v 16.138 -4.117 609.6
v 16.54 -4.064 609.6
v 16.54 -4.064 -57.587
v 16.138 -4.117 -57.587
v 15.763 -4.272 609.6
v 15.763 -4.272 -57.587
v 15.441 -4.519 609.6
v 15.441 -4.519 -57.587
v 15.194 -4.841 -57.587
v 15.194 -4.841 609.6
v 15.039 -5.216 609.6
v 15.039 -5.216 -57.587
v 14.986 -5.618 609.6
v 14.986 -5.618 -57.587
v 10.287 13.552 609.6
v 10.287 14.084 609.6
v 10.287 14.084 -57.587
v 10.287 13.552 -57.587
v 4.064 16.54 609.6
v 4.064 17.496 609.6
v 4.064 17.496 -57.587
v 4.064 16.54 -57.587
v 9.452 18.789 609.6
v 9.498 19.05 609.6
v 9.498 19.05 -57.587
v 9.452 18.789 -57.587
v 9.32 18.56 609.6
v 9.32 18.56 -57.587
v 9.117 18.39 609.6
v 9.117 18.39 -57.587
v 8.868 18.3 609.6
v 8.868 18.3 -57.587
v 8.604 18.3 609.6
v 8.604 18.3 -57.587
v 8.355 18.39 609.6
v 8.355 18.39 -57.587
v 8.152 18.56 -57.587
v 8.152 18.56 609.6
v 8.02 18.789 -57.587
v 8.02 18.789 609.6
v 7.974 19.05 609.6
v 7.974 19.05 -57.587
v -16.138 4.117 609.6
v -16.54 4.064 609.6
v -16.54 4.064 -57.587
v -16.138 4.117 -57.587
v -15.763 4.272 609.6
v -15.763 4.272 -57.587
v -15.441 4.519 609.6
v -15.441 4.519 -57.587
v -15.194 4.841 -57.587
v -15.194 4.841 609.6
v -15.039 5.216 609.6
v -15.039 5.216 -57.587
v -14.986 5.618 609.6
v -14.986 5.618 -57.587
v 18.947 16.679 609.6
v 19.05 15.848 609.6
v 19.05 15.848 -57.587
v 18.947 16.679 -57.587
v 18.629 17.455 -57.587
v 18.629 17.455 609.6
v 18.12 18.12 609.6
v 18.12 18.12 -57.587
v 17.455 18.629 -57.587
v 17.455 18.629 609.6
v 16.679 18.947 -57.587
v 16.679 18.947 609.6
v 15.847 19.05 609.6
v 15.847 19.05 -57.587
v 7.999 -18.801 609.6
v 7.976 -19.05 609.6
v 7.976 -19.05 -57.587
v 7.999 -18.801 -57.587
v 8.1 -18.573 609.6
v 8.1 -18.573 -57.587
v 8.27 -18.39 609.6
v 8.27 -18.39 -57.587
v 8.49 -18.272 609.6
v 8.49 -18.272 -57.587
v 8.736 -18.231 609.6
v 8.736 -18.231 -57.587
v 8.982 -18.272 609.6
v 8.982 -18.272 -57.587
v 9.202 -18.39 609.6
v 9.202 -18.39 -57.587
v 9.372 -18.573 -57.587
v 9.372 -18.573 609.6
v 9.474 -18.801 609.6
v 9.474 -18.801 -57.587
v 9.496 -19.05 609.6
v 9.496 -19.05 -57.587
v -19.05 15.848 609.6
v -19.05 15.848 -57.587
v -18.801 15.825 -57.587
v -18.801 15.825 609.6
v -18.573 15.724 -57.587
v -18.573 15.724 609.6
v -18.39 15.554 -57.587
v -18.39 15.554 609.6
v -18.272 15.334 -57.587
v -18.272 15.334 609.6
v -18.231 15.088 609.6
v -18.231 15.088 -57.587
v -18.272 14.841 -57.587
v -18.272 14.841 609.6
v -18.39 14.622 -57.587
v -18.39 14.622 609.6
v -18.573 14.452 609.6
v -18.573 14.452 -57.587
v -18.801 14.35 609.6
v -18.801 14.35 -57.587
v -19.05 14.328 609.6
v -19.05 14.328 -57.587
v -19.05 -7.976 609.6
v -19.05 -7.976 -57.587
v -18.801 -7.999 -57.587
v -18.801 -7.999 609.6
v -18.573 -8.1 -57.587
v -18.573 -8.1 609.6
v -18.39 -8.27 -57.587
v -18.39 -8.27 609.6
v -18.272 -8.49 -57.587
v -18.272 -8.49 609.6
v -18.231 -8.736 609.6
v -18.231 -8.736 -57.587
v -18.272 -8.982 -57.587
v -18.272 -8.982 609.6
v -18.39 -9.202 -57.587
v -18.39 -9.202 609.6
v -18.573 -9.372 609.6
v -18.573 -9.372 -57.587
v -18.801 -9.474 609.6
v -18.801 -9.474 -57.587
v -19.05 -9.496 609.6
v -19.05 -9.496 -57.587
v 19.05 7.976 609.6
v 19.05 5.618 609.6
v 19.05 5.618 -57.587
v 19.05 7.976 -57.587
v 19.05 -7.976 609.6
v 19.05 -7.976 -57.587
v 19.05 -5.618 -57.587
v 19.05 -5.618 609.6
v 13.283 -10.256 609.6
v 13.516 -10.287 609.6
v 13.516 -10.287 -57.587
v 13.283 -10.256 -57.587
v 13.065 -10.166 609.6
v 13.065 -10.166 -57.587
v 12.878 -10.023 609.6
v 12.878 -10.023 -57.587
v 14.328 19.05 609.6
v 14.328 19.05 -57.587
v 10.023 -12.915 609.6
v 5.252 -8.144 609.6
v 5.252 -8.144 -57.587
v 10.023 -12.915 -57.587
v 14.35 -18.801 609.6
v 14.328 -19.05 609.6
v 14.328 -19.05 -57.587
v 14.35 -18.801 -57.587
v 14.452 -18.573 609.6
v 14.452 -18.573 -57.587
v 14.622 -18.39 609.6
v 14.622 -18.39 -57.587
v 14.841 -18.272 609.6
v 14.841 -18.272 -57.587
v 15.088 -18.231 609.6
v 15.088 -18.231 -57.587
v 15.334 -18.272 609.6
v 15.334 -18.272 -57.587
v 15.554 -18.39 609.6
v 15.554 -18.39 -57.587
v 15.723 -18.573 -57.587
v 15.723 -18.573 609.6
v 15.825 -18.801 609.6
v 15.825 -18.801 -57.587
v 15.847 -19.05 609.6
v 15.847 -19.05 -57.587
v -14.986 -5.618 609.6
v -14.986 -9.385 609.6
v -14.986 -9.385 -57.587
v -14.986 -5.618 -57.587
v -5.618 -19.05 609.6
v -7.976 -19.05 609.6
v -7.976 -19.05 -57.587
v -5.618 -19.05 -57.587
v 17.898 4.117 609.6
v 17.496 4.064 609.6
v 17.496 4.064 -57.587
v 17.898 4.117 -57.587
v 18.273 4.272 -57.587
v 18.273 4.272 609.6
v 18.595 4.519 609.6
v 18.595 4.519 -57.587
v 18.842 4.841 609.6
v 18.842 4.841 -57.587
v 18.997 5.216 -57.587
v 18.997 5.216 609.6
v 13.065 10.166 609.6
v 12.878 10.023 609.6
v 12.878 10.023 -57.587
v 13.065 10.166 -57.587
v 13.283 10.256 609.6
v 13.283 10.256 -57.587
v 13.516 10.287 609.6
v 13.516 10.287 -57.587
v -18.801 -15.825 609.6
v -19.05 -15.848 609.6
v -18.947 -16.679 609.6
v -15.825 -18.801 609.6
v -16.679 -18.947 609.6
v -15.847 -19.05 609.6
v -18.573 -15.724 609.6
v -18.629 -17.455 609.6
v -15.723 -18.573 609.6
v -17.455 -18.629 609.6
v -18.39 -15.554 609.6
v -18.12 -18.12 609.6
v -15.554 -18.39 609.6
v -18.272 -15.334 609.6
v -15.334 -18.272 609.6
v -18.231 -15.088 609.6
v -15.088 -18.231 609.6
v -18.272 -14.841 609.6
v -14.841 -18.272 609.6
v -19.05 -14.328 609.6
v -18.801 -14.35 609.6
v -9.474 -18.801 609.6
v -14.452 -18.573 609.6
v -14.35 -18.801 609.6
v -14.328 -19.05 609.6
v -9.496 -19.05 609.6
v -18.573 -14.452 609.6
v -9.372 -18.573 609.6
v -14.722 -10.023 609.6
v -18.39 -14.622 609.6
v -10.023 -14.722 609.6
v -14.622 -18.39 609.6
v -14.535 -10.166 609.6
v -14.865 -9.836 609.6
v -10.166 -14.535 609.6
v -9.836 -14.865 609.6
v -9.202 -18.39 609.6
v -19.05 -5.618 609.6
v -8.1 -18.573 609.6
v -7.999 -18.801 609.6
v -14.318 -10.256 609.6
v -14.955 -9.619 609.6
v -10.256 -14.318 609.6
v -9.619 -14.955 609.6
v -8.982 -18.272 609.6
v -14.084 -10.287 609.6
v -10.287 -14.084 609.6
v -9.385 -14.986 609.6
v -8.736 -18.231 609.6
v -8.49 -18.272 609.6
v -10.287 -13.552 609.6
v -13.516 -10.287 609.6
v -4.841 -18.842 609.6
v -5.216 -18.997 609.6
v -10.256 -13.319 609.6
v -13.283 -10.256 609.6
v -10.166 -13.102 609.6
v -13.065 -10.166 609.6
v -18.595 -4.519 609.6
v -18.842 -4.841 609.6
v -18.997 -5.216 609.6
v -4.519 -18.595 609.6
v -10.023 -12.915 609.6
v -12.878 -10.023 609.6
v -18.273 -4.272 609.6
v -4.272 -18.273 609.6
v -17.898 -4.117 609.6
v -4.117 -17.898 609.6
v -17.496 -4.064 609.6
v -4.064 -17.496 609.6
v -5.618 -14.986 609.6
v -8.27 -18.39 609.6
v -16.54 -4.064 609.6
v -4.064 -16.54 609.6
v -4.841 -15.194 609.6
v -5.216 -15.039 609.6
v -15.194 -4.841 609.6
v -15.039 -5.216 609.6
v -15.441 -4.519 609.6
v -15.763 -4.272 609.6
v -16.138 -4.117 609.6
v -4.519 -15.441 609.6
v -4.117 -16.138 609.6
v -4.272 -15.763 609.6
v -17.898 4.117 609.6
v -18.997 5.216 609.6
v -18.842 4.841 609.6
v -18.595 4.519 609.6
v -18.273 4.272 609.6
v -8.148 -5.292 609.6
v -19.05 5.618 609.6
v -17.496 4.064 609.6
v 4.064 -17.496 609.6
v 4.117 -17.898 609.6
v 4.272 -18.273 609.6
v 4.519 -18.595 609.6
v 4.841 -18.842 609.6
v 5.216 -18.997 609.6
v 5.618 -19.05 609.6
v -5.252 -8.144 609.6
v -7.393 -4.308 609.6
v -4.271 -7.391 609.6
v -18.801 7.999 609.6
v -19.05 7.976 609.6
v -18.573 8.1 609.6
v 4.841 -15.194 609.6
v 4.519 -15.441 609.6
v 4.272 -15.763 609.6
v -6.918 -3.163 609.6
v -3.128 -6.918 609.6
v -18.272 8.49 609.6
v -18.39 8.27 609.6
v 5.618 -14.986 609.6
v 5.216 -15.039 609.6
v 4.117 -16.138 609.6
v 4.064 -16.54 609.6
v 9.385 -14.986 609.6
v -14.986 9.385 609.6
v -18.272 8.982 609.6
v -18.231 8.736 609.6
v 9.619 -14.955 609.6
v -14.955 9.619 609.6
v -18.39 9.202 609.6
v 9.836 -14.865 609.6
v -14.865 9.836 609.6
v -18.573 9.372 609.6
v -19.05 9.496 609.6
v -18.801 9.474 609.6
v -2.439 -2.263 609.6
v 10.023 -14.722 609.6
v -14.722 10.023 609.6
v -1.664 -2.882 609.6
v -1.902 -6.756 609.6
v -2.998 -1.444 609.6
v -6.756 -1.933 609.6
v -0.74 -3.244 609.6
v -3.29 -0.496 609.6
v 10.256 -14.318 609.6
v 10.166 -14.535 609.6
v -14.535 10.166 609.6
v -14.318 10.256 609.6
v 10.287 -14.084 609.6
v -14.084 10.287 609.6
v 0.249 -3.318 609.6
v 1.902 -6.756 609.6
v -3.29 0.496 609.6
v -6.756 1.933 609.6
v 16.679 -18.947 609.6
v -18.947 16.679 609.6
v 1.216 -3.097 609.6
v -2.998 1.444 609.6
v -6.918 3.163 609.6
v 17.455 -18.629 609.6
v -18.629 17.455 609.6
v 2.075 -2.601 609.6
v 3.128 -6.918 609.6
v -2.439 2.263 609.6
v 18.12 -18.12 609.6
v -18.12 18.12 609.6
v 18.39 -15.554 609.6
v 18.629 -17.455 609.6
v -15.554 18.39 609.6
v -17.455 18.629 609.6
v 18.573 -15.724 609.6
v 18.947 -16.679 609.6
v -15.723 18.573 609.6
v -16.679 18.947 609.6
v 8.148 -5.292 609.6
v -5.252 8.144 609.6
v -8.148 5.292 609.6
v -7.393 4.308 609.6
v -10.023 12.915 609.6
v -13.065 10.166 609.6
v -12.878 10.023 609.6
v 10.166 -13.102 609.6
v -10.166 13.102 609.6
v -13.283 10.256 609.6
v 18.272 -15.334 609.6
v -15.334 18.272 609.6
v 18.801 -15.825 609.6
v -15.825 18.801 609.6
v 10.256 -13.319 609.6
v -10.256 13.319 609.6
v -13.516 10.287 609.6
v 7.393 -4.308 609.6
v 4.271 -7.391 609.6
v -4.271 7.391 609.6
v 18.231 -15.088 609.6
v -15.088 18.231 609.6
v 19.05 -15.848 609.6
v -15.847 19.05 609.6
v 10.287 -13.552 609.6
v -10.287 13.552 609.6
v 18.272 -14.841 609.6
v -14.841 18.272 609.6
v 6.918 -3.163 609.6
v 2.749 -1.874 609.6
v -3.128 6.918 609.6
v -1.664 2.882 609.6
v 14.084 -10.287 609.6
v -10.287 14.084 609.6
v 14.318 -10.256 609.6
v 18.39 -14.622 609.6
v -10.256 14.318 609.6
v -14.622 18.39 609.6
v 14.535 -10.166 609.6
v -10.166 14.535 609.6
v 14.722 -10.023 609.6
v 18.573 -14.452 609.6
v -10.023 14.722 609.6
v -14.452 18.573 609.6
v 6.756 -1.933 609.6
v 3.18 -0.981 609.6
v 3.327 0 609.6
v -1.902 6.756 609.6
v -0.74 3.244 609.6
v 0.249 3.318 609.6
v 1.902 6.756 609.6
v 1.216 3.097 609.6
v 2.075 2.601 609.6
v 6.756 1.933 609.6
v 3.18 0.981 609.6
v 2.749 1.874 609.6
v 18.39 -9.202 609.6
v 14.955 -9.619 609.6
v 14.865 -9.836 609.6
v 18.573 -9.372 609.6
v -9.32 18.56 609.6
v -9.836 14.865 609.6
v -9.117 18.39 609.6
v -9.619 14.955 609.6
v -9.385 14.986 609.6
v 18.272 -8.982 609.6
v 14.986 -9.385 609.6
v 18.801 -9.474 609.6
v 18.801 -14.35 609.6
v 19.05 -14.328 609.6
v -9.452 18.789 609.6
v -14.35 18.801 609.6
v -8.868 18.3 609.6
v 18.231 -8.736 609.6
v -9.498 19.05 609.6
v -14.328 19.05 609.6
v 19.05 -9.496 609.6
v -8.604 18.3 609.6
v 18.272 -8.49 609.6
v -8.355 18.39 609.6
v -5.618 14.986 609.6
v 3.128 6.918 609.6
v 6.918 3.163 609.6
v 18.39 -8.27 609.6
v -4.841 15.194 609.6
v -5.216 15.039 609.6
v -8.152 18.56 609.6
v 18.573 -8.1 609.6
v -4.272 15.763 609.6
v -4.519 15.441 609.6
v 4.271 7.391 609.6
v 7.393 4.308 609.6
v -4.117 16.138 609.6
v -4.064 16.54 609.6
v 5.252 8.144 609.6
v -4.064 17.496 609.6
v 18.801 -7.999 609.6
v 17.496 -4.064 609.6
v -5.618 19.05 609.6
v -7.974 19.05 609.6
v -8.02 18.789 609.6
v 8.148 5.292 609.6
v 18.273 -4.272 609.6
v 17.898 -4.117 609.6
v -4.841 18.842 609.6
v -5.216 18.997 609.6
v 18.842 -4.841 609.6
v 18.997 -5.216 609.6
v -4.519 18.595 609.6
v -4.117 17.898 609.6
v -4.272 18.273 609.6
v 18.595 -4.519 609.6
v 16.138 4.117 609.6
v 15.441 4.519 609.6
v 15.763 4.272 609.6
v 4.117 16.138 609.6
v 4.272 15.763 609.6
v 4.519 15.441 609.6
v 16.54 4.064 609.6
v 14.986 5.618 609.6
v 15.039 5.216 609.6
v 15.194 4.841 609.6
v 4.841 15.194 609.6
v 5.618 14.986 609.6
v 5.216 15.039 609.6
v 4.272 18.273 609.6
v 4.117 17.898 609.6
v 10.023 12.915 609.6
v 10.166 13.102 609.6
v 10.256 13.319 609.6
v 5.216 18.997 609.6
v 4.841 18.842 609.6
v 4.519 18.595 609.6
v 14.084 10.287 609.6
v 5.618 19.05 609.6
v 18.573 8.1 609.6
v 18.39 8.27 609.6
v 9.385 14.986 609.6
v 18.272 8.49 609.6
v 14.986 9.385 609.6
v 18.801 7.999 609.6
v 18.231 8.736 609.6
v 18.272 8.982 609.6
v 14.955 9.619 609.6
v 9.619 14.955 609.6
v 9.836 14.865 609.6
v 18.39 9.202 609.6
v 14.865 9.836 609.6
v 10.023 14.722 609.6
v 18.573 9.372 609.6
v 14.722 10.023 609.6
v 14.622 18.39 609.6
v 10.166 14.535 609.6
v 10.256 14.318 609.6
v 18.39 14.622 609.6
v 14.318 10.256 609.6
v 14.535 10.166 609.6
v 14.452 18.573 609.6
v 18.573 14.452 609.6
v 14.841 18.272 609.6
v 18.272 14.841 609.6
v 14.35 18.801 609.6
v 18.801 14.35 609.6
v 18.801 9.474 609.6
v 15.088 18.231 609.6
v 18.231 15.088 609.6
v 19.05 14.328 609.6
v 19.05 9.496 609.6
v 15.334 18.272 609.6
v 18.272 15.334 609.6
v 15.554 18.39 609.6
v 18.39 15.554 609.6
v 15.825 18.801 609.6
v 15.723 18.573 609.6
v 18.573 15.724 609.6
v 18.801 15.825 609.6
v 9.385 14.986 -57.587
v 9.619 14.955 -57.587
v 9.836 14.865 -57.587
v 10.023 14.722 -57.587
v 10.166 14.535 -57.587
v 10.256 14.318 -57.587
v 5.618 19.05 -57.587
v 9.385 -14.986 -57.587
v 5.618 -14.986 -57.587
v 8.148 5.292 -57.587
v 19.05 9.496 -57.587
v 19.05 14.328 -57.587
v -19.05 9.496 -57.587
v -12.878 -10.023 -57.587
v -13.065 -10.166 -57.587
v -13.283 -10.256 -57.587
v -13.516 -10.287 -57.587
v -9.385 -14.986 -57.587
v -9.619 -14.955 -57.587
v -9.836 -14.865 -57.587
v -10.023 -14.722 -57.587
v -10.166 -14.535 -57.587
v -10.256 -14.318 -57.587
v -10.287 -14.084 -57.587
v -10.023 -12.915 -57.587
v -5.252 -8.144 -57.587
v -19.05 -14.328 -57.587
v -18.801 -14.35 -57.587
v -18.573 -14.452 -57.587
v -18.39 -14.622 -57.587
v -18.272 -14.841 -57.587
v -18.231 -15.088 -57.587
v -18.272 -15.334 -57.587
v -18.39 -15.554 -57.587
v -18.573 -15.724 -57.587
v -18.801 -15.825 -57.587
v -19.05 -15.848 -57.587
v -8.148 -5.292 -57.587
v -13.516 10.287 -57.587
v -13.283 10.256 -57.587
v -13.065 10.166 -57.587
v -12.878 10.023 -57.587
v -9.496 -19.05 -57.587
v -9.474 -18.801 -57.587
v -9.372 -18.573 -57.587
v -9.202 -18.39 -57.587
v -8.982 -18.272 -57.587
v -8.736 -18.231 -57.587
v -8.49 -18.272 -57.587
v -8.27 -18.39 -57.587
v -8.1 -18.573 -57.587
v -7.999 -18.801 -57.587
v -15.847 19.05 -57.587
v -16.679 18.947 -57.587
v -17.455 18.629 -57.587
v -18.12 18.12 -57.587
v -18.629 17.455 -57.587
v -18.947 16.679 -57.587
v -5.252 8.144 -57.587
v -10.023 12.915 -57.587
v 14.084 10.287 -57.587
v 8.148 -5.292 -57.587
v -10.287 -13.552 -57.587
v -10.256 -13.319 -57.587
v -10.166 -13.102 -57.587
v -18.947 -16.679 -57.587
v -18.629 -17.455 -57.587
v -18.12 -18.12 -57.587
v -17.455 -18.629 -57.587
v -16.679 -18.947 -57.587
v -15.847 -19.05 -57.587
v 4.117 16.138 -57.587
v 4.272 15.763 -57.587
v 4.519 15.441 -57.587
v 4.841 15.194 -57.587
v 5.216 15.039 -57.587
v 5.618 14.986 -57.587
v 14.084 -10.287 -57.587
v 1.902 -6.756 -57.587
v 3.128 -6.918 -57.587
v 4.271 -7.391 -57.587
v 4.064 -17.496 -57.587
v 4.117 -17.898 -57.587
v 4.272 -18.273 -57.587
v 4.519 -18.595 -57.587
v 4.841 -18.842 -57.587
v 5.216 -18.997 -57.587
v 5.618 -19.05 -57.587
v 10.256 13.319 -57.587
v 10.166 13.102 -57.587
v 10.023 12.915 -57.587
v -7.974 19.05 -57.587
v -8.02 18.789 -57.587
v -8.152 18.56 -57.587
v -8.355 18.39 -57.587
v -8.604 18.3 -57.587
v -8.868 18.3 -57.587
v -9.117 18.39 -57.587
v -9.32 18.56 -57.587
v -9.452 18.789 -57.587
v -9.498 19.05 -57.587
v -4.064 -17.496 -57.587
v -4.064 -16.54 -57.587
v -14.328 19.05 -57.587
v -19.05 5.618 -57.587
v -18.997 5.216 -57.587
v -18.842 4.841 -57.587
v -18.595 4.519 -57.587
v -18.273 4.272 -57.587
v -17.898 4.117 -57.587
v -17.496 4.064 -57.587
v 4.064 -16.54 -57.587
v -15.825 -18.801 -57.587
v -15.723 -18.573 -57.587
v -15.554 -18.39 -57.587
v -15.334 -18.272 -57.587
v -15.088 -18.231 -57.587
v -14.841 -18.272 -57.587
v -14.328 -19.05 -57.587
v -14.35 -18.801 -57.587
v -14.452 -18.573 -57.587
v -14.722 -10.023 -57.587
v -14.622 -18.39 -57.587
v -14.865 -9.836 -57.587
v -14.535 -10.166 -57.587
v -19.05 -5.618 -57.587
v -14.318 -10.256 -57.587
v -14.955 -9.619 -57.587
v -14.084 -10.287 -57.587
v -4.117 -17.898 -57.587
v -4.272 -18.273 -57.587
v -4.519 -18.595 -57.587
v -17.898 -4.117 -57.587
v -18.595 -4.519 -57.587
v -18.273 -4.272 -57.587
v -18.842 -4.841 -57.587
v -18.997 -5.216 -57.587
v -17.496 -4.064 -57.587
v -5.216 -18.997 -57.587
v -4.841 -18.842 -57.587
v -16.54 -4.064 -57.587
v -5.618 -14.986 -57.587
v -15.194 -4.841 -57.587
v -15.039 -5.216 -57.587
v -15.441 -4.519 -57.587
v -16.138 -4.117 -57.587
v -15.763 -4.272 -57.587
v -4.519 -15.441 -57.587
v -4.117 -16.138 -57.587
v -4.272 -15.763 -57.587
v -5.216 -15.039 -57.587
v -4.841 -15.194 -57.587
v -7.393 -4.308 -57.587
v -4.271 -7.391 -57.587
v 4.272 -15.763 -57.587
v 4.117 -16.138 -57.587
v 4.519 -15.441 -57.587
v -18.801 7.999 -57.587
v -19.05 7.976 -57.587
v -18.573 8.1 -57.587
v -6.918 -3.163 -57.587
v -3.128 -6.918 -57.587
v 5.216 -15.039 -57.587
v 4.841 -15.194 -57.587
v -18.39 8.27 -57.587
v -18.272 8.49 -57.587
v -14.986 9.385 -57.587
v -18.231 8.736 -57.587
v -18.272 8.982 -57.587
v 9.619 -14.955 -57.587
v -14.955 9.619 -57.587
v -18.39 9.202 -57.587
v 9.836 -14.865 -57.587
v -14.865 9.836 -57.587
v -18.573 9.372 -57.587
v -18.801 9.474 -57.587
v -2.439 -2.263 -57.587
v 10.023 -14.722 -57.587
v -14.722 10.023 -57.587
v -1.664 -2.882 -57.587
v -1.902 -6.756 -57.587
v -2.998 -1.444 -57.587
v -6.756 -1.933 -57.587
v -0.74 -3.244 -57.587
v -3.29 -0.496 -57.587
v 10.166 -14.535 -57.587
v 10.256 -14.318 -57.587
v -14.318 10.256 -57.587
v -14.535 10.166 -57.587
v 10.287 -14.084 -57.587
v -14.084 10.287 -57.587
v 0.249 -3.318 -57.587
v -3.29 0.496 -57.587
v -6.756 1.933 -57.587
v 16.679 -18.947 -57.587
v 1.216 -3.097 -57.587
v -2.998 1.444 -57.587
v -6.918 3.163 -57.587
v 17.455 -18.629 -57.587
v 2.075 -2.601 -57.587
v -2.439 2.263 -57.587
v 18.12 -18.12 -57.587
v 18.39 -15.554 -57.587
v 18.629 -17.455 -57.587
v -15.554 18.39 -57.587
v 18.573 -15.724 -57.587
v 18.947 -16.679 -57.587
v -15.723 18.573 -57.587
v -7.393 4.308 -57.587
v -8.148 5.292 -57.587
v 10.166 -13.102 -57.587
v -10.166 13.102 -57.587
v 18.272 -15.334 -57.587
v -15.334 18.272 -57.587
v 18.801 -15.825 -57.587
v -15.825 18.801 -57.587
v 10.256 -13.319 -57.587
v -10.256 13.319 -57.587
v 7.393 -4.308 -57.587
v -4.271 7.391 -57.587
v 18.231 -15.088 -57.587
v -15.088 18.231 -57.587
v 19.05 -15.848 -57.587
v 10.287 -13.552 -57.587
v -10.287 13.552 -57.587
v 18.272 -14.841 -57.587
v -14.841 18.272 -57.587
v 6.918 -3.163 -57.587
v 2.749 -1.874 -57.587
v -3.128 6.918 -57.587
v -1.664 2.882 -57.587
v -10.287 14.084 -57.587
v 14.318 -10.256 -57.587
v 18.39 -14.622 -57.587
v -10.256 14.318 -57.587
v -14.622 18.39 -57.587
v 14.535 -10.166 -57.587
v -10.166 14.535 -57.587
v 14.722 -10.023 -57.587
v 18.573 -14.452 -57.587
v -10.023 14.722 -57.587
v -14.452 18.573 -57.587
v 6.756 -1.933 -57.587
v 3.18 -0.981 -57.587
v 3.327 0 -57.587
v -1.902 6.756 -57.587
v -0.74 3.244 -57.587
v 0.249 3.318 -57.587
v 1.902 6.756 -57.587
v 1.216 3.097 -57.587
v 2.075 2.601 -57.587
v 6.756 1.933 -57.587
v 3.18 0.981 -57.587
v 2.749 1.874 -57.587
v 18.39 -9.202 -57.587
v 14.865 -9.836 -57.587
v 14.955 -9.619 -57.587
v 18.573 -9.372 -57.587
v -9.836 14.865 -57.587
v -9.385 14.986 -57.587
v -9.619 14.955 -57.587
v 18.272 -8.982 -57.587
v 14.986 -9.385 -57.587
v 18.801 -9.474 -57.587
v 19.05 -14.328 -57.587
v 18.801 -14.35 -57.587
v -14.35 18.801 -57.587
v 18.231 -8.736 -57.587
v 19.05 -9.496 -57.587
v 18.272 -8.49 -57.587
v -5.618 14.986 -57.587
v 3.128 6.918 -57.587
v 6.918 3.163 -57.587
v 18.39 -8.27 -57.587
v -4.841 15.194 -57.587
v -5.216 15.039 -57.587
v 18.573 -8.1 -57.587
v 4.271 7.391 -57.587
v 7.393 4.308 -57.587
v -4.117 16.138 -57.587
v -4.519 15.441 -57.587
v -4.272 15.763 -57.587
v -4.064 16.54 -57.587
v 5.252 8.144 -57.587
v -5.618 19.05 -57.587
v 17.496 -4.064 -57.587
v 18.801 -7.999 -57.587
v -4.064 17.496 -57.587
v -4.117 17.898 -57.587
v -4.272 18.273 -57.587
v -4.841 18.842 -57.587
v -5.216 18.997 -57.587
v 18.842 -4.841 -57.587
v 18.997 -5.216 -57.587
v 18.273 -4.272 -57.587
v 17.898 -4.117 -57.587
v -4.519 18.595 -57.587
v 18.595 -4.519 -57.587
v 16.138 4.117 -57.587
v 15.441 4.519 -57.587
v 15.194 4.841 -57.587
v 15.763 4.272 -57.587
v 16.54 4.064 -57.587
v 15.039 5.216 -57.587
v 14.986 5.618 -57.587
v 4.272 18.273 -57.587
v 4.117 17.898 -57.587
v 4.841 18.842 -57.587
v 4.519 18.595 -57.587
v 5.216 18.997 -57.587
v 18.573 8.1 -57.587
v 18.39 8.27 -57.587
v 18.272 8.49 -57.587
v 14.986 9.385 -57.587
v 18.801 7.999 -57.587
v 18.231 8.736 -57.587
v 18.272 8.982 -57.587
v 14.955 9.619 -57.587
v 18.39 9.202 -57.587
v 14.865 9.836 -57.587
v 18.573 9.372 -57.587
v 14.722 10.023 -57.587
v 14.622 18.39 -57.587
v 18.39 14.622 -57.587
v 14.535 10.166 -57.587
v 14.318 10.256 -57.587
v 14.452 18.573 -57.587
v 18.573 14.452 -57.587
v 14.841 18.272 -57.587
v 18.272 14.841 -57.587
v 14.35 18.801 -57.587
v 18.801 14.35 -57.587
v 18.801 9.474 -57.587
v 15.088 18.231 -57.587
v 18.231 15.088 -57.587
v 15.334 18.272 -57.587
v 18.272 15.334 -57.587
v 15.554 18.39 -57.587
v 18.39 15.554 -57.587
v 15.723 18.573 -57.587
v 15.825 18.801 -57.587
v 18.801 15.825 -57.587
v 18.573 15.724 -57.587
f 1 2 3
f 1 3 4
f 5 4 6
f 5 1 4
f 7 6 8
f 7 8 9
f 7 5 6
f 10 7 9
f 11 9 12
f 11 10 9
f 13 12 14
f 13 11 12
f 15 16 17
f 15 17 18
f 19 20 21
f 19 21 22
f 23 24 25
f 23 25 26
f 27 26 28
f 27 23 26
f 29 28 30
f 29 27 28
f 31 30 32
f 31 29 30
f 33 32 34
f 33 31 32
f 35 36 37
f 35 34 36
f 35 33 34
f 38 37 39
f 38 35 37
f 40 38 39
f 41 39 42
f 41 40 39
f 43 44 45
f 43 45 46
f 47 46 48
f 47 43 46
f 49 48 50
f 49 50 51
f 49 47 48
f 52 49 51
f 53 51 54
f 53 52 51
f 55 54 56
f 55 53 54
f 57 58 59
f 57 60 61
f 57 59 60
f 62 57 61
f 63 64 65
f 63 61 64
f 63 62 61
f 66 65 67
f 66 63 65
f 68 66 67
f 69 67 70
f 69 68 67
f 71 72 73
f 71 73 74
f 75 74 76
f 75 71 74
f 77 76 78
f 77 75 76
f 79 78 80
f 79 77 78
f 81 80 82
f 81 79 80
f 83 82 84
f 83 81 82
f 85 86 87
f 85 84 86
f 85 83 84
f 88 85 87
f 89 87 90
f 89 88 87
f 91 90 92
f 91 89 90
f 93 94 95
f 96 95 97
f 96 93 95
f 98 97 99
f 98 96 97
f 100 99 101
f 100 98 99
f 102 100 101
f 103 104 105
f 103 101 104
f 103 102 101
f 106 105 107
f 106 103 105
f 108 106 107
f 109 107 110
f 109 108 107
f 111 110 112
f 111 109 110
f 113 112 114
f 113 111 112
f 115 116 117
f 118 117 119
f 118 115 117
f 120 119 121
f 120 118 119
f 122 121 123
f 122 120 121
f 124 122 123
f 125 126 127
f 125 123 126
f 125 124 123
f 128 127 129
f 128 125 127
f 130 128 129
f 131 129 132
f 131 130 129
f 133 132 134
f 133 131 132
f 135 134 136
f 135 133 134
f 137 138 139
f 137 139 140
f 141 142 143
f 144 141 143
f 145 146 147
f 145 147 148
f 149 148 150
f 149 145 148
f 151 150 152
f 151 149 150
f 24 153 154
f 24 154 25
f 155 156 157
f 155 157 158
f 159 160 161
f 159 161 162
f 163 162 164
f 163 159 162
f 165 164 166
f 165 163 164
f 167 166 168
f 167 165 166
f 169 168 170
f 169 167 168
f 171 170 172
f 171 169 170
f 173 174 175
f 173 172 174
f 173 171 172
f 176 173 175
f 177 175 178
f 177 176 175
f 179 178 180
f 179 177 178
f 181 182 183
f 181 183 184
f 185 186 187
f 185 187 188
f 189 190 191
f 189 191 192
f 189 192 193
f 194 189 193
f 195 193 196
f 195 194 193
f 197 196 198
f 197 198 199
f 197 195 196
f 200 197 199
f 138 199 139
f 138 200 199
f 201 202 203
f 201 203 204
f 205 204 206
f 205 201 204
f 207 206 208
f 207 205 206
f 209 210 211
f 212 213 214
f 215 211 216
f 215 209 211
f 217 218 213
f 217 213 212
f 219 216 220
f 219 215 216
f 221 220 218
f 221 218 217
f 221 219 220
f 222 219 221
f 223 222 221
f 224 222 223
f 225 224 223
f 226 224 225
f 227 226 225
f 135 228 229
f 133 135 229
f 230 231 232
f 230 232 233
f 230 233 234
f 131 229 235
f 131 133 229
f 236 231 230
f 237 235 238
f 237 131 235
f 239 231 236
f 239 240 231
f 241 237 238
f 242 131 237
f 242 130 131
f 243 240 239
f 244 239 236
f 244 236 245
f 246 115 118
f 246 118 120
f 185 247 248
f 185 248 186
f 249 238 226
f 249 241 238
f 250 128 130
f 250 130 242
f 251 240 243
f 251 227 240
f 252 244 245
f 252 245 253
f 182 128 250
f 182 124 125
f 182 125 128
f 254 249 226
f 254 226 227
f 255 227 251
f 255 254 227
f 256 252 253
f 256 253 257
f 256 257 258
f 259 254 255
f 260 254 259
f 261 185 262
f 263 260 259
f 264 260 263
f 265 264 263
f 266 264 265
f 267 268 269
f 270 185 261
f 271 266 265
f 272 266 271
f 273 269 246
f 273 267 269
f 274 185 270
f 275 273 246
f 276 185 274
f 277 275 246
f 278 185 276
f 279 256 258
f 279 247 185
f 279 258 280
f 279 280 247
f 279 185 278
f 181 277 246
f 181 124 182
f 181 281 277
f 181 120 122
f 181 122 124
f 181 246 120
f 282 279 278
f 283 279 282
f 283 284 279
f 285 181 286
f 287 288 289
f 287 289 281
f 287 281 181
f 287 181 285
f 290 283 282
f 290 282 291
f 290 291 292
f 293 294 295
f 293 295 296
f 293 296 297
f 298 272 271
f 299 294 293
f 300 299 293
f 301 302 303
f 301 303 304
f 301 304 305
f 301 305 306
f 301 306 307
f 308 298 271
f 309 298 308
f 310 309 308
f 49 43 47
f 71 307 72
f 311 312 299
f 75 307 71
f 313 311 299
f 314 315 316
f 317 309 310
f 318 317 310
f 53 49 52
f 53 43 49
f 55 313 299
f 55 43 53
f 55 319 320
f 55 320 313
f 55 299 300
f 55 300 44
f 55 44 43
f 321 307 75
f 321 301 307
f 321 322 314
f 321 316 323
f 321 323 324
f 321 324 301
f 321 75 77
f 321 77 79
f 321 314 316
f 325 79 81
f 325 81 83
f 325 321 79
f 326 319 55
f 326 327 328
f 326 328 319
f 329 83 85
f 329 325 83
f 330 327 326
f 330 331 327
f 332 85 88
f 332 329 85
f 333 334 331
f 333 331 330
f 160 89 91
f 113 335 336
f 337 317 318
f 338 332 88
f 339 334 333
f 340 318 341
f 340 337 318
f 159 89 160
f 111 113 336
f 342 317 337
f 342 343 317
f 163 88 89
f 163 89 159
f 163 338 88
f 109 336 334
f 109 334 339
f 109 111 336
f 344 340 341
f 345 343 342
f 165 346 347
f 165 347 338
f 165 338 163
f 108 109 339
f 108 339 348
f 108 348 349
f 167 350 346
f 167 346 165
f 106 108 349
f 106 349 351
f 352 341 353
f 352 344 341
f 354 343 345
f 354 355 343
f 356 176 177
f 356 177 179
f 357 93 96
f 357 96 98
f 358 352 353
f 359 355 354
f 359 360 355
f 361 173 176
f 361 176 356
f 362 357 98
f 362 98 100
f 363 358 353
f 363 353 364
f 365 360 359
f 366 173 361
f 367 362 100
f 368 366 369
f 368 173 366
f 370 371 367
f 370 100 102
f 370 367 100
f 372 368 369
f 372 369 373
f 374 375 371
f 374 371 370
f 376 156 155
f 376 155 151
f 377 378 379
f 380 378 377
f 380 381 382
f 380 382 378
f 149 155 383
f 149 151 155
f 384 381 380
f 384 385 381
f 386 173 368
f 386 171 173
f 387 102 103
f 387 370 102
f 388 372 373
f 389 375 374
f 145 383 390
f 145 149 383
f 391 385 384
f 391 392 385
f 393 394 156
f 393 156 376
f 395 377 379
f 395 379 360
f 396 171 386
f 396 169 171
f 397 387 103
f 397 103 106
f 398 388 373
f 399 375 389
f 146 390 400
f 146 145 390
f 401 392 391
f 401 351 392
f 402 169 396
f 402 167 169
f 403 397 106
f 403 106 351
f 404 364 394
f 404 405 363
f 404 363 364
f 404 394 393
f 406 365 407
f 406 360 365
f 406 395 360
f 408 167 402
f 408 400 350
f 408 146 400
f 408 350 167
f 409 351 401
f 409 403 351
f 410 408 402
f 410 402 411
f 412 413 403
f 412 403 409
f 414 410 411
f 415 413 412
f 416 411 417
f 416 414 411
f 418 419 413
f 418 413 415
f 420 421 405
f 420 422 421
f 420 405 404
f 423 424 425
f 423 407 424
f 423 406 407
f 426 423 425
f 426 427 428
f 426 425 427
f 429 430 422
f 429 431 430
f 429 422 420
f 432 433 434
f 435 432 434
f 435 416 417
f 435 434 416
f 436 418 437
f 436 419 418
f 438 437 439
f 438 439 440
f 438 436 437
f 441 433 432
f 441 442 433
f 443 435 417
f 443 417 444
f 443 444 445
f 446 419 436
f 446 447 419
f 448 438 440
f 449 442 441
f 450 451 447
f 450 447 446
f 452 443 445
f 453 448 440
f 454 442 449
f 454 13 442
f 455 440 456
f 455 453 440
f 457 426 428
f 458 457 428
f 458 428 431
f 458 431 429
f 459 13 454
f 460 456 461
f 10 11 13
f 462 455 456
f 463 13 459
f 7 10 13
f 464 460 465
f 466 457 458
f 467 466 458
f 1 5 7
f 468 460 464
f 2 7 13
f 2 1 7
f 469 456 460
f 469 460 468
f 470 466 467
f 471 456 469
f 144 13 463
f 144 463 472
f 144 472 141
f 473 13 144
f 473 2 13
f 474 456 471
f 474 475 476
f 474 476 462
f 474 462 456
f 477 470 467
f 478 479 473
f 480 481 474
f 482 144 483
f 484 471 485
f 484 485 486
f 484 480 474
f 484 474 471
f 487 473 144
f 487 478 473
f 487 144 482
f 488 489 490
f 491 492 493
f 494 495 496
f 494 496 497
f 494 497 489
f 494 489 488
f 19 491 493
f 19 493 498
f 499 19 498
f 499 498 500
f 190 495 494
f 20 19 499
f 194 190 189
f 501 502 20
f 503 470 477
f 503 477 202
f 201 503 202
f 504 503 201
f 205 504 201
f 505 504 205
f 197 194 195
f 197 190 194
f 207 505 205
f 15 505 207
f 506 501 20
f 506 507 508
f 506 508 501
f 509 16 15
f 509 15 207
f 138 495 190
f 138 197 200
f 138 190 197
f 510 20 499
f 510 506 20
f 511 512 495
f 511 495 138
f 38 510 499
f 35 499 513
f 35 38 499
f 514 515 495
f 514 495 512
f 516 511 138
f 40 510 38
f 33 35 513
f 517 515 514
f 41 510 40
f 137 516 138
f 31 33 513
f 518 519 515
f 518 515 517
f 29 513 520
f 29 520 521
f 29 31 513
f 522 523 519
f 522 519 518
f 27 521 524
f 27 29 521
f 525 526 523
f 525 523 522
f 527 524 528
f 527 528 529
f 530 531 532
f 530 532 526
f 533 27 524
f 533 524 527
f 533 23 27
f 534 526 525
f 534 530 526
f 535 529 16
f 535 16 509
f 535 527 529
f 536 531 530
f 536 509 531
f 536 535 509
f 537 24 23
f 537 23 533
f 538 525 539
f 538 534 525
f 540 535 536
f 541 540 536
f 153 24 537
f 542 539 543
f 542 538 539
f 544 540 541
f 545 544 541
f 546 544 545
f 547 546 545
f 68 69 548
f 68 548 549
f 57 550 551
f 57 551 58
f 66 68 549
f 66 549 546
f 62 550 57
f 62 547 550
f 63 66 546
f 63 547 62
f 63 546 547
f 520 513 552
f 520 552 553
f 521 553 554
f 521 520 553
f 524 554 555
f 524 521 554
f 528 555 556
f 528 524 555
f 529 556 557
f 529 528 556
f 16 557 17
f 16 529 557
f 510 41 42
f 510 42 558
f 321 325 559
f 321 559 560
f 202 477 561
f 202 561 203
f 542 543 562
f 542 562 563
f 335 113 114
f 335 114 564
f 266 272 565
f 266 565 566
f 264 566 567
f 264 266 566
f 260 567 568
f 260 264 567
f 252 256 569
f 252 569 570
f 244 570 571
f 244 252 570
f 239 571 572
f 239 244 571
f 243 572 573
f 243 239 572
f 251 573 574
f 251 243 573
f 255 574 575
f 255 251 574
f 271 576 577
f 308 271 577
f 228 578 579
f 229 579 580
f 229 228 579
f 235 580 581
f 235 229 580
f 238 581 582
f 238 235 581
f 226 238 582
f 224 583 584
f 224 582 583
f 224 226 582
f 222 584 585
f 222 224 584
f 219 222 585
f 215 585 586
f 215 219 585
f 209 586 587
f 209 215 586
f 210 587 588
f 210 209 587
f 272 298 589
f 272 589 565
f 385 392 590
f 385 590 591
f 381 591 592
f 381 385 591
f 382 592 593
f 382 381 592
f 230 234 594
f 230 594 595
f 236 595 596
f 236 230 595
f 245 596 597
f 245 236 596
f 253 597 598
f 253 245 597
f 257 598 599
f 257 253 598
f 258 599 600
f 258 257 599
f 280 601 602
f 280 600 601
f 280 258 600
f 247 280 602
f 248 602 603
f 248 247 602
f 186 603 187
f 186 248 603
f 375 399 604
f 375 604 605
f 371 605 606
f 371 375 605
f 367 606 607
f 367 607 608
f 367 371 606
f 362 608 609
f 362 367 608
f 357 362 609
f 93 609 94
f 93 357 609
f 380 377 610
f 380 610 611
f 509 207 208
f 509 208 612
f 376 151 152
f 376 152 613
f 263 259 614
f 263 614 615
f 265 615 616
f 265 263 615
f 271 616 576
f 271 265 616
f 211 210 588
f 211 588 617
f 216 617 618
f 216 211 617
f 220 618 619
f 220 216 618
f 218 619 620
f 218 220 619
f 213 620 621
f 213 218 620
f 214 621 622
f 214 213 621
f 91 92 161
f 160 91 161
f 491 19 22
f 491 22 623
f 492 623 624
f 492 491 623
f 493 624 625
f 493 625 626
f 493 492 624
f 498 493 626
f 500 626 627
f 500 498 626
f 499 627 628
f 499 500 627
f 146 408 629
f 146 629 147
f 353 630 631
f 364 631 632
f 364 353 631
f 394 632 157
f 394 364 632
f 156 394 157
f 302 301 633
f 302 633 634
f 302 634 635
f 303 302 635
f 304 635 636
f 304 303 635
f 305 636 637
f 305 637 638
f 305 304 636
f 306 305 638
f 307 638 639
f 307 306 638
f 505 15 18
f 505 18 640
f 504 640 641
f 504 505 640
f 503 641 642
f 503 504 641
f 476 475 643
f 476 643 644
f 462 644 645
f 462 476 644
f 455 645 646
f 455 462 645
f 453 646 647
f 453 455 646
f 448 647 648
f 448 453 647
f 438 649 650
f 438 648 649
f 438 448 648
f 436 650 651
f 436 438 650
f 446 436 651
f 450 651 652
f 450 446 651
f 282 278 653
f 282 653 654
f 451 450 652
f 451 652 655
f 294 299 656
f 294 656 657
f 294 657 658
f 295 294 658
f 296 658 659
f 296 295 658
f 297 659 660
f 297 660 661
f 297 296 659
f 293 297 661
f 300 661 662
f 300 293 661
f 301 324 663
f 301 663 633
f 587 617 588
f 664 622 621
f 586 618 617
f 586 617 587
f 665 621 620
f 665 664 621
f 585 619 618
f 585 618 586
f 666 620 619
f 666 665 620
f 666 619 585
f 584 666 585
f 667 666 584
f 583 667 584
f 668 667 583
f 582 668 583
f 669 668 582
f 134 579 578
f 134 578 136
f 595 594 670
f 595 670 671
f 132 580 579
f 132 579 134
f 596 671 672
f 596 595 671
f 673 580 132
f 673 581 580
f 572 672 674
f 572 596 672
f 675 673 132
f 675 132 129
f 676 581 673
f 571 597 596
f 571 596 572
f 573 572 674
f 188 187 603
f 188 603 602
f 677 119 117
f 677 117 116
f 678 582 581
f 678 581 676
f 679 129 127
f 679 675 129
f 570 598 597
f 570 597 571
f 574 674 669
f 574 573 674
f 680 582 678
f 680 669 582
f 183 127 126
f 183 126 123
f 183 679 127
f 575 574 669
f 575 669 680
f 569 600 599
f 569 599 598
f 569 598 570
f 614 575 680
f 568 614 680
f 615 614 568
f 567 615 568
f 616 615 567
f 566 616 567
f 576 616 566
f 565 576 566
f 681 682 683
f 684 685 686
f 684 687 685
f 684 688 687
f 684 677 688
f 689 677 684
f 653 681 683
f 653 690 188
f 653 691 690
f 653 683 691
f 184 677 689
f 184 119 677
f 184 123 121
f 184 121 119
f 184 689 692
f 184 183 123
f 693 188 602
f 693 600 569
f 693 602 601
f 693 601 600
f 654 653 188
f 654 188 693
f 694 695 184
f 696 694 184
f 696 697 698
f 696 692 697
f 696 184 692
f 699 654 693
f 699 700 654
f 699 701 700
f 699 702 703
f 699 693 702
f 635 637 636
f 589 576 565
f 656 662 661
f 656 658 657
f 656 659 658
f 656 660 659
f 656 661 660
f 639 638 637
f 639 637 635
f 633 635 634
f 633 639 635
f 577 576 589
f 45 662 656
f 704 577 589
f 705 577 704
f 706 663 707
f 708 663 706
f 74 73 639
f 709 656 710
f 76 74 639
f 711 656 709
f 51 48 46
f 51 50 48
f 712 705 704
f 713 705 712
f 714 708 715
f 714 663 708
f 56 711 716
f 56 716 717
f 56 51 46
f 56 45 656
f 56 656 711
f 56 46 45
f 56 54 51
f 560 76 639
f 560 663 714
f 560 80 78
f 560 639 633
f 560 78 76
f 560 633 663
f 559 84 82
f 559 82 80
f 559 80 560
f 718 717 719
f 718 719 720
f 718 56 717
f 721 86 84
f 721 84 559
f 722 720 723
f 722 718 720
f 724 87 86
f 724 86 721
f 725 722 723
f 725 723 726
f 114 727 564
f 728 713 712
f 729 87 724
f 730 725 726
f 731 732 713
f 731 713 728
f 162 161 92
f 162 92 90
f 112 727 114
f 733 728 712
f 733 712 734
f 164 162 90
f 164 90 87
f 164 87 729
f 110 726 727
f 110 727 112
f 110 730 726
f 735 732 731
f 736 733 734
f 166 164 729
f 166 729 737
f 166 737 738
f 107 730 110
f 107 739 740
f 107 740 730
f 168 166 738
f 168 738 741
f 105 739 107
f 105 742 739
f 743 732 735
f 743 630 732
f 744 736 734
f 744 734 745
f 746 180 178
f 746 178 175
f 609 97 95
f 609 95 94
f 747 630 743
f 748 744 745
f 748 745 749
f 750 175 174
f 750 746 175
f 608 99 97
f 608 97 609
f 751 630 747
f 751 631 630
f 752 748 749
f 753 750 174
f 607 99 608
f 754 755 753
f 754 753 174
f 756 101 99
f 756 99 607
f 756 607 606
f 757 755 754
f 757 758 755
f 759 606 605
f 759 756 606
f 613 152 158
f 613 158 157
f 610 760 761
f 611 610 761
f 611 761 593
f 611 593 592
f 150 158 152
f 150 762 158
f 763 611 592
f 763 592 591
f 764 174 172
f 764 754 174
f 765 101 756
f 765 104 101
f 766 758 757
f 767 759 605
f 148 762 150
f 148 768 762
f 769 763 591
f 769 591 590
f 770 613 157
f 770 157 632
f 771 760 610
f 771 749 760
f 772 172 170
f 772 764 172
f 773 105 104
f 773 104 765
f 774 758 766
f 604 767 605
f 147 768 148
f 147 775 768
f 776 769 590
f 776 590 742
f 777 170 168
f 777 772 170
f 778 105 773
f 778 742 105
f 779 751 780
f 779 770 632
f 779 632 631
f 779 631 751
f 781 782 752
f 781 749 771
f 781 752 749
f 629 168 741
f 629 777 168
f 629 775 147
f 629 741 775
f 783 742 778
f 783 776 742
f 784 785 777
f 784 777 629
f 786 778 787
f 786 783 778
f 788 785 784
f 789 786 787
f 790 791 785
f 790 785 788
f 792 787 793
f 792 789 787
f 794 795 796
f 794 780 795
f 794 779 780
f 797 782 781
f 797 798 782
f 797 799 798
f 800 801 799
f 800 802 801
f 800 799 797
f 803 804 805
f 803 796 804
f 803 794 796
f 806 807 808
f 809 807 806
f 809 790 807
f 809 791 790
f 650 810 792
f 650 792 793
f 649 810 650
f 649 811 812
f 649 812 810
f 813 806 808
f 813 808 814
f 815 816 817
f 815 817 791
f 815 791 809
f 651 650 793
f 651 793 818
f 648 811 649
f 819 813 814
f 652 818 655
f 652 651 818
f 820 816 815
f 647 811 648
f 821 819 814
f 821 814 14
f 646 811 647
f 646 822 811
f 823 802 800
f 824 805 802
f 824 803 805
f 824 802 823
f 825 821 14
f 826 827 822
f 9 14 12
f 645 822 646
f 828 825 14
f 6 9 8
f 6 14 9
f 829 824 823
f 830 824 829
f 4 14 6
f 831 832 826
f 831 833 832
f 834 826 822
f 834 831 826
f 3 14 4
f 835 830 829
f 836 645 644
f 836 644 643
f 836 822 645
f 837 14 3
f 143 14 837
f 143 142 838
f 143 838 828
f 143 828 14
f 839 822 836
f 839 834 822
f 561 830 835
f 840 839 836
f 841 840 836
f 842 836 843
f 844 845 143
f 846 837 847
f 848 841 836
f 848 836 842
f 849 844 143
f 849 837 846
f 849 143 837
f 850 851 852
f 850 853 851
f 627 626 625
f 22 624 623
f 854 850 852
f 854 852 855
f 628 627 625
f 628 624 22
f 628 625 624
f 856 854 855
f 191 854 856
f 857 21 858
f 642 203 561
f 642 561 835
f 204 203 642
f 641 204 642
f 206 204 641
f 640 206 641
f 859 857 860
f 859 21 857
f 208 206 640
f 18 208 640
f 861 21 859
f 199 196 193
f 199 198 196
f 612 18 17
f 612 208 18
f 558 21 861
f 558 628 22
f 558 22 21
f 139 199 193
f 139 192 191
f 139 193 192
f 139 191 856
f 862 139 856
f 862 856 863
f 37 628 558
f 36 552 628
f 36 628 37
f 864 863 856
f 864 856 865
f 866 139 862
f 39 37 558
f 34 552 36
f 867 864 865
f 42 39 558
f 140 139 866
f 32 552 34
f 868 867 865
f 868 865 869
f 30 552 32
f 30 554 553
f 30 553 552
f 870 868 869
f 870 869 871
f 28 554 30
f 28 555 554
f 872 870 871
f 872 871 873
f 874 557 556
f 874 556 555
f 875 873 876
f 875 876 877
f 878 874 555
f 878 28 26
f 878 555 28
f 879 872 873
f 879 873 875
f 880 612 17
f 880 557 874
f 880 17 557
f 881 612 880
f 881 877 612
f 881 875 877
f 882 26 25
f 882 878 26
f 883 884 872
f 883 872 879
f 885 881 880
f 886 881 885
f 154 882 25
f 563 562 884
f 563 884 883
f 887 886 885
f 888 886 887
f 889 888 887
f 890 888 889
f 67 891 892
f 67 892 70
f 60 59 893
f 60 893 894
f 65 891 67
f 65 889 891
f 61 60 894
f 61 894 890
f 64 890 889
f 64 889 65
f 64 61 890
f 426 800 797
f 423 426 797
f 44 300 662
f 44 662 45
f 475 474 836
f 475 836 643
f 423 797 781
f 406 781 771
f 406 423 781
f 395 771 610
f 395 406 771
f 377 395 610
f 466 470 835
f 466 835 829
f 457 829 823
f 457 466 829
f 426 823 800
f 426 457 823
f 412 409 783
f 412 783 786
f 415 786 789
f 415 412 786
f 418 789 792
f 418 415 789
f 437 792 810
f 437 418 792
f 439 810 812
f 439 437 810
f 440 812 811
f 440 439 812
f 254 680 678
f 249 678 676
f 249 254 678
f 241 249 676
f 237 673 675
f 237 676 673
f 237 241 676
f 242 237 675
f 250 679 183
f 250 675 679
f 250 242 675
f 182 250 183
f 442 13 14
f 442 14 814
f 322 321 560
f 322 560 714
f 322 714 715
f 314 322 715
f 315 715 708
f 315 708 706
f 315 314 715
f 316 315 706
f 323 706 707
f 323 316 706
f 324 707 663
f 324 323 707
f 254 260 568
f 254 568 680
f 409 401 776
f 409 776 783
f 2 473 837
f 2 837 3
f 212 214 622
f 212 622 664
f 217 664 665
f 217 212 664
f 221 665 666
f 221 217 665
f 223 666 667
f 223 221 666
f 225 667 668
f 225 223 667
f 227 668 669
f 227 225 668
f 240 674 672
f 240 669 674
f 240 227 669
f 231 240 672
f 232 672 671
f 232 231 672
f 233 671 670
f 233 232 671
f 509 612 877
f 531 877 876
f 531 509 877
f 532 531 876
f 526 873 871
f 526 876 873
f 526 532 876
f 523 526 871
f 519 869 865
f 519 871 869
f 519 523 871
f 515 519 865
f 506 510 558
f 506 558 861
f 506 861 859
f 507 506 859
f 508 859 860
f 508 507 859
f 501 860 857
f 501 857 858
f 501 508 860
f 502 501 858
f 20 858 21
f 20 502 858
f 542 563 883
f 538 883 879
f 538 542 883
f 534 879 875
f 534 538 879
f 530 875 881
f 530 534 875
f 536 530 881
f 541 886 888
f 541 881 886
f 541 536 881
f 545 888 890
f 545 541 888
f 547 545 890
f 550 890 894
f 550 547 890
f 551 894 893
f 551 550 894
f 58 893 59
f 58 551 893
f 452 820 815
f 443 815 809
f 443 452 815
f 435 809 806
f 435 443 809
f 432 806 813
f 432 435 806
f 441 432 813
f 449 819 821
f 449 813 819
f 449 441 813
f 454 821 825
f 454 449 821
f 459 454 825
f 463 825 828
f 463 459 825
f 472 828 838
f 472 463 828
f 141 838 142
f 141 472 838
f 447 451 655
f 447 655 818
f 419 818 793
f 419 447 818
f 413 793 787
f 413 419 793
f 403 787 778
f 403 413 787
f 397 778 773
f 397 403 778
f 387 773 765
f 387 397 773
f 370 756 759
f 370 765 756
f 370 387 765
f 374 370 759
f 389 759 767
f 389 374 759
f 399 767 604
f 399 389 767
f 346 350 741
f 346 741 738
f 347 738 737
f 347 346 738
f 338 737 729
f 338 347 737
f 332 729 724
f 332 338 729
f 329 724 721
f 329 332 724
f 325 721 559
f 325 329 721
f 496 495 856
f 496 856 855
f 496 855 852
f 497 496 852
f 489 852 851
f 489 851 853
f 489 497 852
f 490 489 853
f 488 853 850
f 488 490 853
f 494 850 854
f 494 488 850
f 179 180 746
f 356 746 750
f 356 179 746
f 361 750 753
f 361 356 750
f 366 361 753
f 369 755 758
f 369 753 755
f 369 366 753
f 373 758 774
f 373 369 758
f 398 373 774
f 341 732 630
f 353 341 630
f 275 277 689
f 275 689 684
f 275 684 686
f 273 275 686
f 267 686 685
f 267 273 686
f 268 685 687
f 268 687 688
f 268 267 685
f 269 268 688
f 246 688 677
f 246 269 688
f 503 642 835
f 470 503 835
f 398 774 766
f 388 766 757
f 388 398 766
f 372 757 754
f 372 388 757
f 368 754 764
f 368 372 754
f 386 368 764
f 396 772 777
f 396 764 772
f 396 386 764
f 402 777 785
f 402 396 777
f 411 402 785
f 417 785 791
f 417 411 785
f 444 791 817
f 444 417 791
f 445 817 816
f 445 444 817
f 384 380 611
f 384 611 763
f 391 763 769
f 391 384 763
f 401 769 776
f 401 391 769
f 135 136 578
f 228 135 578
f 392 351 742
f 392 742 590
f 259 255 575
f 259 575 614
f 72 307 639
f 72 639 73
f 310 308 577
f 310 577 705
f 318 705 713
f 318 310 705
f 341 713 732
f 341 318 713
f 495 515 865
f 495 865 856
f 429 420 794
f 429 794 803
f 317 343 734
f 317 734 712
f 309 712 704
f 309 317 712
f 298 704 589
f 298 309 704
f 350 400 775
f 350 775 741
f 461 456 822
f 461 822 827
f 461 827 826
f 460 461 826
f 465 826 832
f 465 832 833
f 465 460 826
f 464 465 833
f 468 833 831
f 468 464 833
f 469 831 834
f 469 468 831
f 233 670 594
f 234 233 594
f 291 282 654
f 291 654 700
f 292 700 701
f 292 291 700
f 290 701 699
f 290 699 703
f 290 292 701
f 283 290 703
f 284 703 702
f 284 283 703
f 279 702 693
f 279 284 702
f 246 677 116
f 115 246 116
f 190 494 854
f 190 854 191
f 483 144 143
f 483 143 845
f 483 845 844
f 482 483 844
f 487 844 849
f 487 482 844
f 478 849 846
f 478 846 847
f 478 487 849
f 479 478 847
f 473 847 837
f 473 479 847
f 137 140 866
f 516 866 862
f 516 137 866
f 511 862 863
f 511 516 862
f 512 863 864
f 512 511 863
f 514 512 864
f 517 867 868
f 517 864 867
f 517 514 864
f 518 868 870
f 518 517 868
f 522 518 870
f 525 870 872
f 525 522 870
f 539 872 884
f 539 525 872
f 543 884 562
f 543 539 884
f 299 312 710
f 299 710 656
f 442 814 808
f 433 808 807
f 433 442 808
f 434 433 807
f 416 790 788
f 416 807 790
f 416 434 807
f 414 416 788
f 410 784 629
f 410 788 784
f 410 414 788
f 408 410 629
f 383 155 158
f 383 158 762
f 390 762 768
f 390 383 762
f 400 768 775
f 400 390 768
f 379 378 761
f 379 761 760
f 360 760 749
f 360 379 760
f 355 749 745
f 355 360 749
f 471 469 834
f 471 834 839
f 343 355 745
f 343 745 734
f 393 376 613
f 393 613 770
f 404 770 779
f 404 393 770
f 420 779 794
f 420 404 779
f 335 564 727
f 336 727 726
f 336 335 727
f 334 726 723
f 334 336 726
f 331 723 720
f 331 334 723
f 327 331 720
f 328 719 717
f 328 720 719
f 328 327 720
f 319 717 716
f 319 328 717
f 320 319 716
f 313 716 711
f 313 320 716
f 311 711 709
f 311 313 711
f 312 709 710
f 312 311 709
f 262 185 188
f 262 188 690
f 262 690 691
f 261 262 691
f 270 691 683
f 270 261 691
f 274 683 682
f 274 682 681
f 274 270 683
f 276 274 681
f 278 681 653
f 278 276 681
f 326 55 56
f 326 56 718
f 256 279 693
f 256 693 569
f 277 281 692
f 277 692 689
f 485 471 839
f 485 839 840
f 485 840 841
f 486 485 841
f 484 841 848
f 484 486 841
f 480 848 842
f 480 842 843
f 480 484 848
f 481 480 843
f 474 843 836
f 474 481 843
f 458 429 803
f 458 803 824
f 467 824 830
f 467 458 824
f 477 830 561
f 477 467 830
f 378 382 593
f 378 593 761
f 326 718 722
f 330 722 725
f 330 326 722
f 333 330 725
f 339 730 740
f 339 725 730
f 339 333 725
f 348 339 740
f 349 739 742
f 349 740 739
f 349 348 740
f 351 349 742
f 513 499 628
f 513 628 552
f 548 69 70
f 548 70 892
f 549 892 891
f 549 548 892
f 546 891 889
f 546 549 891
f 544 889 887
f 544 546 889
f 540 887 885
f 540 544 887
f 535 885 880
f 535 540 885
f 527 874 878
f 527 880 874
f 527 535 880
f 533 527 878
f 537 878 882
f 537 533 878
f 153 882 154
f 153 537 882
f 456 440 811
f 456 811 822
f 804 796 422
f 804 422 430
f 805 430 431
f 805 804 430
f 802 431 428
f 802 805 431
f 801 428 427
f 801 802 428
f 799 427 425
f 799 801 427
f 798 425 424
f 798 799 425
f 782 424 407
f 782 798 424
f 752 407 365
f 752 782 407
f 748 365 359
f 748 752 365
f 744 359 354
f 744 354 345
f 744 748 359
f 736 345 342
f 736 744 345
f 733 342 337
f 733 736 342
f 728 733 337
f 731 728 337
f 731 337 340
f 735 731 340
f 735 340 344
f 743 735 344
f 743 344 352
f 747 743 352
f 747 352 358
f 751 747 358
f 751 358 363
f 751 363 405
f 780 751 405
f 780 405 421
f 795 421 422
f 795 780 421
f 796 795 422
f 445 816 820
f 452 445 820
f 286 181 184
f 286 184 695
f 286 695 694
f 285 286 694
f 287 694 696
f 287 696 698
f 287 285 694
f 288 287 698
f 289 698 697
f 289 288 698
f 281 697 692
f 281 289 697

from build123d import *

# Parameters (mm, degrees)
SKETCH1_R               = 3.3274
BOSS_EXTRUDE1_DEPTH     = 609.6
SKETCH2_W               = 555.737416111
SKETCH2_H               = 51.354372661
CUT_EXTRUDE1_DEPTH      = 5.08
CUT_EXTRUDE1_DEPTH_BACK = 41.148


with BuildPart() as part:
    # Sketch1 → Boss-Extrude1 (new body, symmetric)
    with BuildSketch(Plane.XY):
        with BuildLine():
            Line((-10.287, 13.552357131), (-10.287, 14.0843))
            ThreePointArc((-10.287, 14.0843), (-10.022898185, 14.721898185), (-9.3853, 14.986))
            Line((-9.3853, 14.986), (-5.617617549, 14.986))
            ThreePointArc((-5.617617549, 14.986), (-4.519044045, 15.441044045), (-4.064, 16.539617549))
            Line((-4.064, 16.539617549), (-4.064, 17.496382451))
            ThreePointArc((-4.064, 17.496382451), (-4.519044045, 18.594955955), (-5.617617549, 19.05))
            Line((-5.617617549, 19.05), (-7.974178704, 19.05))
            ThreePointArc((-7.974178704, 19.05), (-8.736178704, 18.288), (-9.498178704, 19.05))
            Line((-9.498178704, 19.05), (-14.327719207, 19.05))
            ThreePointArc((-14.327719207, 19.05), (-15.087603123, 18.231251131), (-15.847487039, 19.05))
            ThreePointArc((-15.847487039, 19.05), (-18.120176289, 18.120192083), (-19.05, 15.847509295))
            ThreePointArc((-19.05, 15.847509295), (-18.231250992, 15.08762539), (-19.05, 14.327741484))
            Line((-19.05, 14.327741484), (-19.05, 9.496091471))
            ThreePointArc((-19.05, 9.496091471), (-18.231250992, 8.736207565), (-19.05, 7.97632366))
            Line((-19.05, 7.97632366), (-19.05, 5.617617549))
            ThreePointArc((-19.05, 5.617617549), (-18.594955955, 4.519044045), (-17.496382451, 4.064))
            Line((-17.496382451, 4.064), (-16.539617549, 4.064))
            ThreePointArc((-16.539617549, 4.064), (-15.441044045, 4.519044045), (-14.986, 5.617617549))
            Line((-14.986, 5.617617549), (-14.986, 9.385342516))
            ThreePointArc((-14.986, 9.385342516), (-14.721898185, 10.022940701), (-14.0843, 10.287042516))
            Line((-14.0843, 10.287042516), (-13.516042086, 10.287042516))
            ThreePointArc((-13.516042086, 10.287042516), (-13.170975923, 10.218404478), (-12.878443117, 10.022939917))
            Line((-12.878443117, 10.022939917), (-8.14758008, 5.292065243))
            ThreePointArc((-8.14758008, 5.292065243), (-7.117955879, 3.751120653), (-6.7564, 1.933453584))
            Line((-6.7564, 1.933453584), (-6.7564, -1.933453584))
            ThreePointArc((-6.7564, -1.933453584), (-7.117955879, -3.751120653), (-8.14758008, -5.292065243))
            Line((-8.14758008, -5.292065243), (-12.878443117, -10.022939917))
            ThreePointArc((-12.878443117, -10.022939917), (-13.170975923, -10.218404478), (-13.516042086, -10.287042516))
            Line((-13.516042086, -10.287042516), (-14.0843, -10.287042516))
            ThreePointArc((-14.0843, -10.287042516), (-14.721898185, -10.022940701), (-14.986, -9.385342516))
            Line((-14.986, -9.385342516), (-14.986, -5.617617549))
            ThreePointArc((-14.986, -5.617617549), (-15.441044045, -4.519044045), (-16.539617549, -4.064))
            Line((-16.539617549, -4.064), (-17.496382451, -4.064))
            ThreePointArc((-17.496382451, -4.064), (-18.594955955, -4.519044045), (-19.05, -5.617617549))
            Line((-19.05, -5.617617549), (-19.05, -7.976318491))
            ThreePointArc((-19.05, -7.976318491), (-18.231250992, -8.736202396), (-19.05, -9.496086302))
            Line((-19.05, -9.496086302), (-19.05, -14.32774291))
            ThreePointArc((-19.05, -14.32774291), (-18.231250992, -15.087626816), (-19.05, -15.847510721))
            ThreePointArc((-19.05, -15.847510721), (-18.120175716, -18.120192644), (-15.847486868, -19.05))
            ThreePointArc((-15.847486868, -19.05), (-15.087602952, -18.231251131), (-14.327719036, -19.05))
            Line((-14.327719036, -19.05), (-9.496062448, -19.05))
            ThreePointArc((-9.496062448, -19.05), (-8.736178532, -18.231251131), (-7.976294616, -19.05))
            Line((-7.976294616, -19.05), (-5.617617549, -19.05))
            ThreePointArc((-5.617617549, -19.05), (-4.519044045, -18.594955955), (-4.064, -17.496382451))
            Line((-4.064, -17.496382451), (-4.064, -16.539617549))
            ThreePointArc((-4.064, -16.539617549), (-4.519044045, -15.441044045), (-5.617617549, -14.986))
            Line((-5.617617549, -14.986), (-9.3853, -14.986))
            ThreePointArc((-9.3853, -14.986), (-10.022898185, -14.721898185), (-10.287, -14.0843))
            Line((-10.287, -14.0843), (-10.287, -13.552357131))
            ThreePointArc((-10.287, -13.552357131), (-10.218362387, -13.207291992), (-10.022898969, -12.91475973))
            Line((-10.022898969, -12.91475973), (-5.252158105, -8.144007132))
            ThreePointArc((-5.252158105, -8.144007132), (-3.715177372, -7.117027388), (-1.902183975, -6.7564))
            Line((-1.902183975, -6.7564), (1.902183975, -6.7564))
            ThreePointArc((1.902183975, -6.7564), (3.715177372, -7.117027388), (5.252158105, -8.144007132))
            Line((5.252158105, -8.144007132), (10.022898969, -12.91475973))
            ThreePointArc((10.022898969, -12.91475973), (10.218362387, -13.207291992), (10.287, -13.552357131))
            Line((10.287, -13.552357131), (10.287, -14.0843))
            ThreePointArc((10.287, -14.0843), (10.022898185, -14.721898185), (9.3853, -14.986))
            Line((9.3853, -14.986), (5.617617549, -14.986))
            ThreePointArc((5.617617549, -14.986), (4.519044045, -15.441044045), (4.064, -16.539617549))
            Line((4.064, -16.539617549), (4.064, -17.496382451))
            ThreePointArc((4.064, -17.496382451), (4.519044045, -18.594955955), (5.617617549, -19.05))
            Line((5.617617549, -19.05), (7.976294616, -19.05))
            ThreePointArc((7.976294616, -19.05), (8.736178532, -18.231251131), (9.496062448, -19.05))
            Line((9.496062448, -19.05), (14.327719036, -19.05))
            ThreePointArc((14.327719036, -19.05), (15.087602952, -18.231251131), (15.847486868, -19.05))
            ThreePointArc((15.847486868, -19.05), (18.120175716, -18.120192644), (19.05, -15.847510721))
            ThreePointArc((19.05, -15.847510721), (18.231250992, -15.087626816), (19.05, -14.32774291))
            Line((19.05, -14.32774291), (19.05, -9.496086302))
            ThreePointArc((19.05, -9.496086302), (18.231250992, -8.736202396), (19.05, -7.976318491))
            Line((19.05, -7.976318491), (19.05, -5.617617549))
            ThreePointArc((19.05, -5.617617549), (18.594955955, -4.519044045), (17.496382451, -4.064))
            Line((17.496382451, -4.064), (16.539617549, -4.064))
            ThreePointArc((16.539617549, -4.064), (15.441044045, -4.519044045), (14.986, -5.617617549))
            Line((14.986, -5.617617549), (14.986, -9.385342516))
            ThreePointArc((14.986, -9.385342516), (14.721898185, -10.022940701), (14.0843, -10.287042516))
            Line((14.0843, -10.287042516), (13.516042086, -10.287042516))
            ThreePointArc((13.516042086, -10.287042516), (13.170975923, -10.218404478), (12.878443117, -10.022939917))
            Line((12.878443117, -10.022939917), (8.14758008, -5.292065243))
            ThreePointArc((8.14758008, -5.292065243), (7.117955879, -3.751120653), (6.7564, -1.933453584))
            Line((6.7564, -1.933453584), (6.7564, 1.933453584))
            ThreePointArc((6.7564, 1.933453584), (7.117955879, 3.751120653), (8.14758008, 5.292065243))
            Line((8.14758008, 5.292065243), (12.878443117, 10.022939917))
            ThreePointArc((12.878443117, 10.022939917), (13.170975923, 10.218404478), (13.516042086, 10.287042516))
            Line((13.516042086, 10.287042516), (14.0843, 10.287042516))
            ThreePointArc((14.0843, 10.287042516), (14.721898185, 10.022940701), (14.986, 9.385342516))
            Line((14.986, 9.385342516), (14.986, 5.617617549))
            ThreePointArc((14.986, 5.617617549), (15.441044045, 4.519044045), (16.539617549, 4.064))
            Line((16.539617549, 4.064), (17.496382451, 4.064))
            ThreePointArc((17.496382451, 4.064), (18.594955955, 4.519044045), (19.05, 5.617617549))
            Line((19.05, 5.617617549), (19.05, 7.97632366))
            ThreePointArc((19.05, 7.97632366), (18.231250992, 8.736207565), (19.05, 9.496091471))
            Line((19.05, 9.496091471), (19.05, 14.327741484))
            ThreePointArc((19.05, 14.327741484), (18.231250992, 15.08762539), (19.05, 15.847509295))
            ThreePointArc((19.05, 15.847509295), (18.120176289, 18.120192083), (15.847487039, 19.05))
            ThreePointArc((15.847487039, 19.05), (15.087603123, 18.231251131), (14.327719207, 19.05))
            Line((14.327719207, 19.05), (9.498178704, 19.05))
            ThreePointArc((9.498178704, 19.05), (8.736178704, 18.288), (7.974178704, 19.05))
            Line((7.974178704, 19.05), (5.617617549, 19.05))
            ThreePointArc((5.617617549, 19.05), (4.519044045, 18.594955955), (4.064, 17.496382451))
            Line((4.064, 17.496382451), (4.064, 16.539617549))
            ThreePointArc((4.064, 16.539617549), (4.519044045, 15.441044045), (5.617617549, 14.986))
            Line((5.617617549, 14.986), (9.3853, 14.986))
            ThreePointArc((9.3853, 14.986), (10.022898185, 14.721898185), (10.287, 14.0843))
            Line((10.287, 14.0843), (10.287, 13.552357131))
            ThreePointArc((10.287, 13.552357131), (10.218362387, 13.207291992), (10.022898969, 12.91475973))
            Line((10.022898969, 12.91475973), (5.252158105, 8.144007132))
            ThreePointArc((5.252158105, 8.144007132), (3.715177372, 7.117027388), (1.902183975, 6.7564))
            Line((1.902183975, 6.7564), (-1.902183975, 6.7564))
            ThreePointArc((-1.902183975, 6.7564), (-3.715177372, 7.117027388), (-5.252158105, 8.144007132))
            Line((-5.252158105, 8.144007132), (-10.022898969, 12.91475973))
            ThreePointArc((-10.022898969, 12.91475973), (-10.218362387, 13.207291992), (-10.287, 13.552357131))
        make_face()
        Circle(SKETCH1_R, mode=Mode.SUBTRACT)
    extrude(amount=BOSS_EXTRUDE1_DEPTH, both=True)

    # Sketch2 → Cut-Extrude1 (cut, two sides)
    with BuildSketch(Plane(origin=(19.05, 0, 0), x_dir=(0, 0, -1), z_dir=(1, 0, 0))) as cut_extrude1_sk:
        with Locations((335.456045341, -0.9801838)):
            Rectangle(SKETCH2_W, SKETCH2_H)
    extrude(amount=CUT_EXTRUDE1_DEPTH, mode=Mode.SUBTRACT)
    extrude(cut_extrude1_sk.sketch, amount=-CUT_EXTRUDE1_DEPTH_BACK, mode=Mode.SUBTRACT)


solid = part.part
